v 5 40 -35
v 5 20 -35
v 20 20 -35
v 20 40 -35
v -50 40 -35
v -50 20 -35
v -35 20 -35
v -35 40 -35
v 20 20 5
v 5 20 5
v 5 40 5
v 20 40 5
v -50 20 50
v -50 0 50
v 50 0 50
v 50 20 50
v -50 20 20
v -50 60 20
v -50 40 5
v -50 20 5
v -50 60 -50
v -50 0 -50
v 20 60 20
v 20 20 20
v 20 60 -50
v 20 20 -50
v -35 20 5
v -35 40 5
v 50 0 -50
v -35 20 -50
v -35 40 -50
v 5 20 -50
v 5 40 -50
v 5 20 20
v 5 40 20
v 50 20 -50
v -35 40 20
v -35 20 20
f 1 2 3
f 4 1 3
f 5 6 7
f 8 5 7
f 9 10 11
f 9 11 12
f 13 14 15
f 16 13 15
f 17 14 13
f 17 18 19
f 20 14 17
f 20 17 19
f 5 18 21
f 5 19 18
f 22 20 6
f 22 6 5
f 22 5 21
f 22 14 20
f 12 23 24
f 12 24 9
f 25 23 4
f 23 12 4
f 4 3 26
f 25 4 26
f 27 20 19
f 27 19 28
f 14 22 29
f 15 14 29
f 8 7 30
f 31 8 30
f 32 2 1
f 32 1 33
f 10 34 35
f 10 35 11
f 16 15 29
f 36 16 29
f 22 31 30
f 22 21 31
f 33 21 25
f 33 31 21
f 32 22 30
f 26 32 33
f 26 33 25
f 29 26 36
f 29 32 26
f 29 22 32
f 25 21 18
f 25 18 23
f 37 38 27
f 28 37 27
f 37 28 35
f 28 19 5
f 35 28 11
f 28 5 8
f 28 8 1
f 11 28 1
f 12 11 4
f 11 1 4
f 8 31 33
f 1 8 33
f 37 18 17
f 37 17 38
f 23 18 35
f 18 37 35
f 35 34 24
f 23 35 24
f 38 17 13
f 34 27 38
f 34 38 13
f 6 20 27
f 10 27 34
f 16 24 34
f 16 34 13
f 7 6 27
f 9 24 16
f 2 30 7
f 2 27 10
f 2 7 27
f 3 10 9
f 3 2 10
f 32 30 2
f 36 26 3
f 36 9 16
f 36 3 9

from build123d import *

# Parameters (mm, degrees)
CROQUIS1_W              = 100
CROQUIS1_H              = 100
SALIENTE_EXTRUIR1_DEPTH = 20
CROQUIS2_W              = 15
CROQUIS2_H              = 15
SALIENTE_EXTRUIR2_DEPTH = 20
CROQUIS3_W              = 70
CROQUIS3_H              = 70
SALIENTE_EXTRUIR3_DEPTH = 20


with BuildPart() as part:
    # Croquis1 → Saliente-Extruir1 (new body)
    with BuildSketch(Plane(origin=(0, 0, 0), x_dir=(1, 0, 0), z_dir=(0, 1, 0))):
        Rectangle(CROQUIS1_W, CROQUIS1_H)
    extrude(amount=SALIENTE_EXTRUIR1_DEPTH)

    # Croquis2 → Saliente-Extruir2 (add)
    with BuildSketch(Plane(origin=(0, 20, 0), x_dir=(1, 0, 0), z_dir=(0, 1, 0))):
        with Locations((-42.5, -12.5)):
            Rectangle(CROQUIS2_W, CROQUIS2_H)
        with Locations((-42.5, 42.5)):
            Rectangle(CROQUIS2_W, CROQUIS2_H)
        with Locations((12.5, 42.5)):
            Rectangle(CROQUIS2_W, CROQUIS2_H)
        with Locations((12.5, -12.5)):
            Rectangle(CROQUIS2_W, CROQUIS2_H)
    extrude(amount=SALIENTE_EXTRUIR2_DEPTH)

    # Croquis3 → Saliente-Extruir3 (add)
    with BuildSketch(Plane(origin=(0, 40, 0), x_dir=(1, 0, 0), z_dir=(0, 1, 0))):
        with Locations((-15, 15)):
            Rectangle(CROQUIS3_W, CROQUIS3_H)
    extrude(amount=SALIENTE_EXTRUIR3_DEPTH)


solid = part.part
